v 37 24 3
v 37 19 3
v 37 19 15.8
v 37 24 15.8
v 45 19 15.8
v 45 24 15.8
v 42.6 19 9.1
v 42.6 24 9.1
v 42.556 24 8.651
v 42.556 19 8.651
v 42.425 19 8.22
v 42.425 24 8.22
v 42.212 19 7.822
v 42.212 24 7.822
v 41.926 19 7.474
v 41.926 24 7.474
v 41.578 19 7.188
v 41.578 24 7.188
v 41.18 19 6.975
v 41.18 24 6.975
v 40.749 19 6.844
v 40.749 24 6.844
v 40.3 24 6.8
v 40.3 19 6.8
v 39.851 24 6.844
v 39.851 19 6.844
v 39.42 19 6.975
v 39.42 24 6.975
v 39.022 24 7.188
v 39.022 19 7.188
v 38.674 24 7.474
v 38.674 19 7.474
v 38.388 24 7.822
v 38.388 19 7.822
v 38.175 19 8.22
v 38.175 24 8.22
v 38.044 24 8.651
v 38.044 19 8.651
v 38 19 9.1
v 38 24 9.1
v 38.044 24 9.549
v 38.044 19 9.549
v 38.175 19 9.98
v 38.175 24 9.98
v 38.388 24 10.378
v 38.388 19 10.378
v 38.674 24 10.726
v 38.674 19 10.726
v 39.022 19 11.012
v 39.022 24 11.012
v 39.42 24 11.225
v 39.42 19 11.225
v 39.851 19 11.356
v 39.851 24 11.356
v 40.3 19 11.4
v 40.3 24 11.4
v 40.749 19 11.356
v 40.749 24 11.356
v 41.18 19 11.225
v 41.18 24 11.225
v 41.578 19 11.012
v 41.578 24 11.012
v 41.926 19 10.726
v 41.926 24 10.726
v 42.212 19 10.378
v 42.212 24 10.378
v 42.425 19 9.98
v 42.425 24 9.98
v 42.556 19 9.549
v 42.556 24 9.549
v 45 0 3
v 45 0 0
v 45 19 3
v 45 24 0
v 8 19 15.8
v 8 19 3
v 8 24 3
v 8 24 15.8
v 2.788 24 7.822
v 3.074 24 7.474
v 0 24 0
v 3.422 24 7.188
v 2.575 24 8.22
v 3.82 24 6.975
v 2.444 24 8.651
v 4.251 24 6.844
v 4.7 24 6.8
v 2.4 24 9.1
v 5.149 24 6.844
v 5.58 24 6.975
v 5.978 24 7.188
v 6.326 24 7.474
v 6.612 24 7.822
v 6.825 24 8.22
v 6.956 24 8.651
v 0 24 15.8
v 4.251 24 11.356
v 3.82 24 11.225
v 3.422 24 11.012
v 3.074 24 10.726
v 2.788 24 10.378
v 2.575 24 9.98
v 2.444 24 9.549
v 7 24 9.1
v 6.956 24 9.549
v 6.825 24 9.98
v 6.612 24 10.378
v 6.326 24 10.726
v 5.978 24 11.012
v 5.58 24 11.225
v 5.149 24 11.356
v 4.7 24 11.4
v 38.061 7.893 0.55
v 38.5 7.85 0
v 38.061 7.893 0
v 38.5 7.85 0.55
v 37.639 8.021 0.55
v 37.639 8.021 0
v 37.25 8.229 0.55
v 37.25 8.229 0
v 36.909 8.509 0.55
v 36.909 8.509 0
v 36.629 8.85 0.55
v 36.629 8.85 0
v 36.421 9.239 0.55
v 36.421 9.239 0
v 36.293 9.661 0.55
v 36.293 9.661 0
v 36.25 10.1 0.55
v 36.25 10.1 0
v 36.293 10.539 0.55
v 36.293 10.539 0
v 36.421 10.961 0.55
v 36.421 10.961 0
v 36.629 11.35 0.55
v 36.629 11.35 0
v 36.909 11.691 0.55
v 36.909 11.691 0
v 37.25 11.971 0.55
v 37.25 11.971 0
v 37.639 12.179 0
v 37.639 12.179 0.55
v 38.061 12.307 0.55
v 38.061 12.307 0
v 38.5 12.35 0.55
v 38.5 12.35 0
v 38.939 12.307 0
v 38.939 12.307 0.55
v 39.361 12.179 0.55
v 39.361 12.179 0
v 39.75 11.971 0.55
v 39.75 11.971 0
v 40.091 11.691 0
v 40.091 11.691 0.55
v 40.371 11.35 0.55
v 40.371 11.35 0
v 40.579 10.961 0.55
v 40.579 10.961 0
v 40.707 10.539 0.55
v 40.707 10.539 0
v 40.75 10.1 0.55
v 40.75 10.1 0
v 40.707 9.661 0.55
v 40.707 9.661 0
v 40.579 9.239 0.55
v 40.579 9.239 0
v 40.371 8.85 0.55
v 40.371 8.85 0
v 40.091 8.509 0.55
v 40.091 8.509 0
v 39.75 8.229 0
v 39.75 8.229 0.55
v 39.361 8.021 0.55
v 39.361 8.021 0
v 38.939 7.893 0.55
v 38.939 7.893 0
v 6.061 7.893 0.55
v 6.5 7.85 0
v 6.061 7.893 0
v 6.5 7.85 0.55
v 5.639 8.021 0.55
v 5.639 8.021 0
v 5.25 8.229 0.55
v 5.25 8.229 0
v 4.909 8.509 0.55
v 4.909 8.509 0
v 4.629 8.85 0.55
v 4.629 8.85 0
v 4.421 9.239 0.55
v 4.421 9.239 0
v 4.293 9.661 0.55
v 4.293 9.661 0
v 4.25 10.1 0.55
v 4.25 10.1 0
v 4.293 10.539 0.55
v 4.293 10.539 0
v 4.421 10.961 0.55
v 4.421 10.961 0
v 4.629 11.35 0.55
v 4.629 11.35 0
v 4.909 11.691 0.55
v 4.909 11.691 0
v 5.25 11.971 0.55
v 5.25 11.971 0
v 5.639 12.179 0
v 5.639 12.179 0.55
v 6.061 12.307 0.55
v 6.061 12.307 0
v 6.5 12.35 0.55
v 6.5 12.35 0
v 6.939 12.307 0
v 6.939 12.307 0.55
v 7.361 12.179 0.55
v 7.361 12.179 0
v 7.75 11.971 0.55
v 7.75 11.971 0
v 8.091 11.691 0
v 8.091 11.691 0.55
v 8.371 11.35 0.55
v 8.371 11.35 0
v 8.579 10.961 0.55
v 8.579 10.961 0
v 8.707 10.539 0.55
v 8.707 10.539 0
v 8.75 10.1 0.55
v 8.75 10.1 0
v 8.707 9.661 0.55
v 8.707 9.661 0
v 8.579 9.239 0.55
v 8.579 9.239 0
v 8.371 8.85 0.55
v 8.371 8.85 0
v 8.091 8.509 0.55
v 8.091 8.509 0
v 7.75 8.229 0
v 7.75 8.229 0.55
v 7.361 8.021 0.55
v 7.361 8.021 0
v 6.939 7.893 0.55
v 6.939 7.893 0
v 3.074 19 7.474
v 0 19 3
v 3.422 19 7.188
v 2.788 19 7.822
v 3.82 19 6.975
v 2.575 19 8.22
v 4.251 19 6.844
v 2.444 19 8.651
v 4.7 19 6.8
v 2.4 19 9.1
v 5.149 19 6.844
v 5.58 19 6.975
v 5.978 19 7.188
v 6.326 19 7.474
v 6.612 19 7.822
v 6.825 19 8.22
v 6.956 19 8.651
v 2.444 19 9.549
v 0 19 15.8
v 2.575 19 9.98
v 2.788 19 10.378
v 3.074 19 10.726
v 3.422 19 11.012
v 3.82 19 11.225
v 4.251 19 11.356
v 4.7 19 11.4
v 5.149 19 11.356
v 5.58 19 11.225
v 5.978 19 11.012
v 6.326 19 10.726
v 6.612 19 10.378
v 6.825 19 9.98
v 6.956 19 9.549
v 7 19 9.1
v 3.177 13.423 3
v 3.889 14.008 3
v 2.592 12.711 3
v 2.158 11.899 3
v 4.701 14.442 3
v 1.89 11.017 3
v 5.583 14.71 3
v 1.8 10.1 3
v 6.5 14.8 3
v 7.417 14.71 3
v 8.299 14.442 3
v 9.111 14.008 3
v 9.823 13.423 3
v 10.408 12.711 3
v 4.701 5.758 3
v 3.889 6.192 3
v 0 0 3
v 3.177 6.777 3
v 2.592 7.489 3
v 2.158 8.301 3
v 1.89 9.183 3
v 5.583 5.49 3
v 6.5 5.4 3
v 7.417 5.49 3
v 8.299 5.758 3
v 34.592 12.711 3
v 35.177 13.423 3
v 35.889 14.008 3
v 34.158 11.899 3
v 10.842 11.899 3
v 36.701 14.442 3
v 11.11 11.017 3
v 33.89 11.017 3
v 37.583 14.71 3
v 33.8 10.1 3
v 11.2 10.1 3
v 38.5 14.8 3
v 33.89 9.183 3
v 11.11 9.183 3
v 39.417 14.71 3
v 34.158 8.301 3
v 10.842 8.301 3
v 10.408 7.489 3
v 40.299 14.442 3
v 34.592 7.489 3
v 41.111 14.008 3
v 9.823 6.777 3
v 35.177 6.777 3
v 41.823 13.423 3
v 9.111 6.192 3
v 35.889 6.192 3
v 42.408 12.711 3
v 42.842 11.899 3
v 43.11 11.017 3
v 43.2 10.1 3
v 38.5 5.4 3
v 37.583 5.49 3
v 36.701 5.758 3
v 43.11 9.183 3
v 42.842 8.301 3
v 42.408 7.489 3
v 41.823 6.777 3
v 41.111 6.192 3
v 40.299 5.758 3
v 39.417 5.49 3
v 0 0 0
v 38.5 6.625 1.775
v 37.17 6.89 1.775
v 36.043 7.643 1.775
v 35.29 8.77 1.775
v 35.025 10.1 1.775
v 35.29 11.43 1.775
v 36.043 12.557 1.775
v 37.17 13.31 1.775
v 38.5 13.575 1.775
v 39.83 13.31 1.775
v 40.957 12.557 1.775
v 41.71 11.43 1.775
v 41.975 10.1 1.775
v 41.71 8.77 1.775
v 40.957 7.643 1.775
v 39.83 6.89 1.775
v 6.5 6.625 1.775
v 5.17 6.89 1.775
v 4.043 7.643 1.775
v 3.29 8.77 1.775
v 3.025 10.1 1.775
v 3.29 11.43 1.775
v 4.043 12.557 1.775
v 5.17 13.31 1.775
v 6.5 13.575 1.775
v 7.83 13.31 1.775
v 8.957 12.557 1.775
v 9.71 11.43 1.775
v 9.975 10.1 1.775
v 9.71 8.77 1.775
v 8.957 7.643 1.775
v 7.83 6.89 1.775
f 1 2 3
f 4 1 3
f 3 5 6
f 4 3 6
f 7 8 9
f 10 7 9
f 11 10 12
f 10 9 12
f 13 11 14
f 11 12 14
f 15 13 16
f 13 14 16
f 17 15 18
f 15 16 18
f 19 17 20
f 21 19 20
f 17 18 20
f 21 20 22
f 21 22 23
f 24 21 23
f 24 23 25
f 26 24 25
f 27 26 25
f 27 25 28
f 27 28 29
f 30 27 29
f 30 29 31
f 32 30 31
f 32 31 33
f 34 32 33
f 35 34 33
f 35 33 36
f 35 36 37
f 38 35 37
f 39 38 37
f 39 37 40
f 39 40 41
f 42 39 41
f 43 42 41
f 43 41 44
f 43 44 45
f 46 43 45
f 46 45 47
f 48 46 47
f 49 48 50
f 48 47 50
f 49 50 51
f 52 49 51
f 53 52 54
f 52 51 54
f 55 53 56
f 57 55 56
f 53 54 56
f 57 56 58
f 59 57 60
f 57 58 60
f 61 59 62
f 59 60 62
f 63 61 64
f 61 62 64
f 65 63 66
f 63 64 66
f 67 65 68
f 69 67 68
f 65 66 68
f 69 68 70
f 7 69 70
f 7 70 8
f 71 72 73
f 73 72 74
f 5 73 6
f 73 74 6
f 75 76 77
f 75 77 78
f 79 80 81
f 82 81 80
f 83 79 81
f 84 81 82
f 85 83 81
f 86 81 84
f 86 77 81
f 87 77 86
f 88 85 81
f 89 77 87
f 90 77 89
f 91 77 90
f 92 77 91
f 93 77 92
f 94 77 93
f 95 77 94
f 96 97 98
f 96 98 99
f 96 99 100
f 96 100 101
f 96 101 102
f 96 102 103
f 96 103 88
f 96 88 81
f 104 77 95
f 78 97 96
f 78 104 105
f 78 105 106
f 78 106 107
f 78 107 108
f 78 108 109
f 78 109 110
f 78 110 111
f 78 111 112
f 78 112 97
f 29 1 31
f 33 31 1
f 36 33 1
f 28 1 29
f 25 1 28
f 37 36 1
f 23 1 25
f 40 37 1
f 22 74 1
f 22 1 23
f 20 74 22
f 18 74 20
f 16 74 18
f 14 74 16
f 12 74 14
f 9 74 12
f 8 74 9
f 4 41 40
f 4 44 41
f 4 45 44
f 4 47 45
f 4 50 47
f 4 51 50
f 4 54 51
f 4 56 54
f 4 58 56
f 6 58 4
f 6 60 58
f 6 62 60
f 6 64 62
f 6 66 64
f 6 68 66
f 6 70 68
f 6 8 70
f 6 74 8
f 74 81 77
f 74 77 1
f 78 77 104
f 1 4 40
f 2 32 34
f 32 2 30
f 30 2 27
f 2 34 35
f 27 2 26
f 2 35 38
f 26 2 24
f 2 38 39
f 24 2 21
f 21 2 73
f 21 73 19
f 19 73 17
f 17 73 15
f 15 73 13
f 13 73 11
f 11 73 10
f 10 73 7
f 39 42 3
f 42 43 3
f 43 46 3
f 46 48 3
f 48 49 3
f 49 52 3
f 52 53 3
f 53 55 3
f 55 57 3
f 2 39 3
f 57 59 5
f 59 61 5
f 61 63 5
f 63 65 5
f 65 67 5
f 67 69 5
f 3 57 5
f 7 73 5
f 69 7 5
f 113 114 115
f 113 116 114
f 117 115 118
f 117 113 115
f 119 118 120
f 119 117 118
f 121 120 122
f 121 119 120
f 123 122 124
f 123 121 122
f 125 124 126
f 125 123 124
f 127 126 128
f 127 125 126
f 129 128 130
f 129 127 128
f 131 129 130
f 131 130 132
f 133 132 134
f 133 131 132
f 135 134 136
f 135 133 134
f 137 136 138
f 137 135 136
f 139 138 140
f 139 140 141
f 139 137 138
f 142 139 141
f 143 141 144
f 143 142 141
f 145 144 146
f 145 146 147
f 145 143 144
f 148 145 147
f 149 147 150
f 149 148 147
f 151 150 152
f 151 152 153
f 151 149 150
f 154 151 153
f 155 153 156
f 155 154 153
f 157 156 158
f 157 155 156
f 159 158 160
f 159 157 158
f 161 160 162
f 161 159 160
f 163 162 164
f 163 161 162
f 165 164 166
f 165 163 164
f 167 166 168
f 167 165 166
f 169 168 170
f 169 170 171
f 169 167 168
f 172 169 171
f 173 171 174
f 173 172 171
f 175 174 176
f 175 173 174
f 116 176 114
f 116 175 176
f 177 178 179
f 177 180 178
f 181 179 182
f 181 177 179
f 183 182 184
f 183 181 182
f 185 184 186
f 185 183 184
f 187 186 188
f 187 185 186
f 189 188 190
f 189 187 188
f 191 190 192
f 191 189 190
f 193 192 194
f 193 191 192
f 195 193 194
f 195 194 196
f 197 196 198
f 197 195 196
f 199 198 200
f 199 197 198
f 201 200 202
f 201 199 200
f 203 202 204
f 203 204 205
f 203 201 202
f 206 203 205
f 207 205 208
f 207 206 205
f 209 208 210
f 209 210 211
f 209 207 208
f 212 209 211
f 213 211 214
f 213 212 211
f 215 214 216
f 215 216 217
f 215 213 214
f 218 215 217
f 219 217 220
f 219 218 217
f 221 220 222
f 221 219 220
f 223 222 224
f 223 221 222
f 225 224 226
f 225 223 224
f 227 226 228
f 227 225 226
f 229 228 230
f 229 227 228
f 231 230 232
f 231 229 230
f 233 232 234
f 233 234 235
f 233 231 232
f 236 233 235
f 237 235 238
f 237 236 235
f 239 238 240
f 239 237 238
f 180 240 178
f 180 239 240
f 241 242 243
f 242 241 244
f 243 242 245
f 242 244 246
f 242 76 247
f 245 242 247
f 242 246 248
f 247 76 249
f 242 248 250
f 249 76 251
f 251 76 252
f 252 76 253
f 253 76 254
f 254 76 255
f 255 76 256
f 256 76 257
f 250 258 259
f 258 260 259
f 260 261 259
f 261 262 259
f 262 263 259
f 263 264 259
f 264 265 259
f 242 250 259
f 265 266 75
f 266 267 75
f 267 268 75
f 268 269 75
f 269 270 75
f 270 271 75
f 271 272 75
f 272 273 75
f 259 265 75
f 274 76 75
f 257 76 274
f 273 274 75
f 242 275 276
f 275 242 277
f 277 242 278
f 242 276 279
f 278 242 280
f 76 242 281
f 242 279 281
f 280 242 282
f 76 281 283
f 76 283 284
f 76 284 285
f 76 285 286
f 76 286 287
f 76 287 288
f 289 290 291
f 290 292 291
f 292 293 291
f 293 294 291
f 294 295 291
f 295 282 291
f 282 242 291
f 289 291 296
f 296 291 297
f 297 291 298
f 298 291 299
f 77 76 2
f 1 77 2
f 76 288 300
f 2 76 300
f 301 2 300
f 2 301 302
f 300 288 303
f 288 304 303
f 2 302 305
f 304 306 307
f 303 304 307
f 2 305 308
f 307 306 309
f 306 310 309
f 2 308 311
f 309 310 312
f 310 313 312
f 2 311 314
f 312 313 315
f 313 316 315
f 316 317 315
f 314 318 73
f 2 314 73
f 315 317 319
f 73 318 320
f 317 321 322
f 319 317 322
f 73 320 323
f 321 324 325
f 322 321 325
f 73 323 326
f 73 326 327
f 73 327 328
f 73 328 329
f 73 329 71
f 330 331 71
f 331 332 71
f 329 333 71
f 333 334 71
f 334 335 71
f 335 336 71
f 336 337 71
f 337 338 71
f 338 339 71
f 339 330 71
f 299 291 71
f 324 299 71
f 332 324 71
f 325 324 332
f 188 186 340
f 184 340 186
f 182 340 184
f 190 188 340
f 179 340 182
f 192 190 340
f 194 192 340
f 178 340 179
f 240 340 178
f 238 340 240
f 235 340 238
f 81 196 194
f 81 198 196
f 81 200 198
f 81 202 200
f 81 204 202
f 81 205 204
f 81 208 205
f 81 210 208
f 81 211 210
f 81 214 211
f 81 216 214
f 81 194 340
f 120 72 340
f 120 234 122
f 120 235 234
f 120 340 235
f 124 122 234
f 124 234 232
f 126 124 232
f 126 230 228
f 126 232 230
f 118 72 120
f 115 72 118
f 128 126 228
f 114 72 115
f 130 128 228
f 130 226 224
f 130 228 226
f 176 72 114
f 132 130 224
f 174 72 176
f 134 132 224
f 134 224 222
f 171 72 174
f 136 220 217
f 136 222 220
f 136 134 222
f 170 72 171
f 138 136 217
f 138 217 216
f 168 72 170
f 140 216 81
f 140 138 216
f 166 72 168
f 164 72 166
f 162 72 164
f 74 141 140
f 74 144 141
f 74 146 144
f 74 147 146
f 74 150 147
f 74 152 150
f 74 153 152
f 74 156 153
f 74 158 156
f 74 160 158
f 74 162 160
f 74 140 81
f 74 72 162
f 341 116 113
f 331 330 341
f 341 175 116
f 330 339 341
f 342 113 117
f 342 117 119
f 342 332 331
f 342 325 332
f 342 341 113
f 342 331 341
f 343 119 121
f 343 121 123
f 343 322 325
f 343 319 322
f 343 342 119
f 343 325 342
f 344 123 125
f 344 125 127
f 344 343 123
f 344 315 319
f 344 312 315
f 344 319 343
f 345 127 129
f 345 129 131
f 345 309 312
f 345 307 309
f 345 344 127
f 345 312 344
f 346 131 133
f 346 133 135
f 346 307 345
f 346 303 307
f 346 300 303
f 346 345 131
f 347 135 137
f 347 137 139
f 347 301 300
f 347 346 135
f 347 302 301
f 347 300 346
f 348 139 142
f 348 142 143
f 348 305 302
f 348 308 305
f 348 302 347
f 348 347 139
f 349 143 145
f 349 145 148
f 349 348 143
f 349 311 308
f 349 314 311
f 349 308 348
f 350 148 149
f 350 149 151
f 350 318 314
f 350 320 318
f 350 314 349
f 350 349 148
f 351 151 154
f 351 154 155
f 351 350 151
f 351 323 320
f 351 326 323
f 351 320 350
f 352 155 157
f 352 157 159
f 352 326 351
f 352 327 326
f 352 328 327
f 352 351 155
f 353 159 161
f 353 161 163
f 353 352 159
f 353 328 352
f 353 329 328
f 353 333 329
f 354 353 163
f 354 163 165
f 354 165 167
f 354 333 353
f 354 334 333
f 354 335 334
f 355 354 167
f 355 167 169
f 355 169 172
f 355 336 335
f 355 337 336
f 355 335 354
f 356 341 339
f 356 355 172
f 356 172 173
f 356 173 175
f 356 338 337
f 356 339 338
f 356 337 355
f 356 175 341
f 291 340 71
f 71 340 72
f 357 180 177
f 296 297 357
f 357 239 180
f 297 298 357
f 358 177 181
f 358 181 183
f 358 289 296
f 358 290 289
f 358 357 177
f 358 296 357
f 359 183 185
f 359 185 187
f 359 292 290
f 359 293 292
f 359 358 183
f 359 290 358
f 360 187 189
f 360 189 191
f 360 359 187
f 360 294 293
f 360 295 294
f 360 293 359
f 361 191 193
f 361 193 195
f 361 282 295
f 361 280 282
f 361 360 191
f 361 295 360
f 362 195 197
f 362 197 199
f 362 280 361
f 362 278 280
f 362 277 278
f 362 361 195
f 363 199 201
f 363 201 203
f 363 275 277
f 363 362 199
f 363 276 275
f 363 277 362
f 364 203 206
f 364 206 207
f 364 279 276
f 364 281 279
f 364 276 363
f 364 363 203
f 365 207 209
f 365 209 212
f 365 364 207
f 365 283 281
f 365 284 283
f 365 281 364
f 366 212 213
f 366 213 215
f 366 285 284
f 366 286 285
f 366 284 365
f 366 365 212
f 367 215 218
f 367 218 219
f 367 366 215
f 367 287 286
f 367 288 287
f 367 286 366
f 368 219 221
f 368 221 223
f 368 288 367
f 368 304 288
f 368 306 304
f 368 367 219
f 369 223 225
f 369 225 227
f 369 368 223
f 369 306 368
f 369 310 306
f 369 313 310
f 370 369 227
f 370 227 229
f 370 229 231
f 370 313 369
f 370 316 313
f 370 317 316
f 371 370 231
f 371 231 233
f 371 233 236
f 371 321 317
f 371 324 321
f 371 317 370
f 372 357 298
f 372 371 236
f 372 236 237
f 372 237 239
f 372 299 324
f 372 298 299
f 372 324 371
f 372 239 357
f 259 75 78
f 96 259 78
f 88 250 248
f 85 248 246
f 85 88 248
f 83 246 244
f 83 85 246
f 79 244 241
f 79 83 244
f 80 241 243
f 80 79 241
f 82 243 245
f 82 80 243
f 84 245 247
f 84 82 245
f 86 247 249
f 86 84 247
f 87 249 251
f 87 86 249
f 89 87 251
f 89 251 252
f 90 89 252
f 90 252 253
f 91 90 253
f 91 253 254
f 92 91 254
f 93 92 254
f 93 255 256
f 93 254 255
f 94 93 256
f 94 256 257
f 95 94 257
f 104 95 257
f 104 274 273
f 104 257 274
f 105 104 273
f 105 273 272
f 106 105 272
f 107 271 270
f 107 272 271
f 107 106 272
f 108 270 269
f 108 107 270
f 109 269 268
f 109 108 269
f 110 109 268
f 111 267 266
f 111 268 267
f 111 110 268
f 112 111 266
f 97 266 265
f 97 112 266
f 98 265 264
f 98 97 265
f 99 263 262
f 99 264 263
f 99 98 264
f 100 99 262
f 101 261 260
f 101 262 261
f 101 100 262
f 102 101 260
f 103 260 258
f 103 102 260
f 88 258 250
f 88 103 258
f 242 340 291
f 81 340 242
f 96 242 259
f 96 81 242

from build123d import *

# Parameters (mm, degrees)
ESQUISSE1_W                = 45
ESQUISSE1_H                = 19
BOSS_EXTRU_1_DEPTH         = 3
R_P_TITION_LIN_AIRE3_COUNT = 2
R_P_TITION_LIN_AIRE3_PITCH = 32
ESQUISSE7_W                = 15.8
ESQUISSE7_H                = 5
BOSS_EXTRU_2_DEPTH         = 45
ESQUISSE8_W                = 29
ESQUISSE8_H                = 12.8
ENL_V_MAT_EXTRU_4_DEPTH    = 3
ESQUISSE8_5_W              = 29
ESQUISSE8_5_H              = 12.8
ENL_V_MAT_EXTRU_5_DEPTH    = 6
ESQUISSE9_R                = 2.3
ENL_V_MAT_EXTRU_6_DEPTH    = 10


with BuildPart() as part:
    # Esquisse1 → Boss.-Extru.1 (new body)
    with BuildSketch(Plane.XY):
        with Locations((22.5, 9.5)):
            Rectangle(ESQUISSE1_W, ESQUISSE1_H)
    extrude(amount=BOSS_EXTRU_1_DEPTH)

    # Esquisse5 → Fraisage pour vis _ t_te frais_e M42 (revolve, cut)
    with BuildSketch(Plane(origin=(38.5, 10.1, 3), x_dir=(0, -1, 0), z_dir=(1, 0, 0))):
        Polygon((0, 0), (0, 3), (2.25, 3), (2.25, 2.45), (4.7, 0), align=None)
    fraisage_pour_vis_t_te_frais_e_m42 = revolve(axis=Axis((38.5, 10.1, 9.35), (0, 0, -1)), mode=Mode.SUBTRACT)

    # R_p_tition lin_aire3: Fraisage pour vis _ t_te frais_e M42 ×2
    with Locations(*[(-i * R_P_TITION_LIN_AIRE3_PITCH, 0, 0) for i in range(1, R_P_TITION_LIN_AIRE3_COUNT)]):
        add(fraisage_pour_vis_t_te_frais_e_m42, mode=Mode.SUBTRACT)

    # Esquisse7 → Boss.-Extru.2 (add)
    with BuildSketch(Plane(origin=(45, 19, 0), x_dir=(0, 0, 1), z_dir=(-1, 0, 0))):
        with Locations((7.9, 2.5)):
            Rectangle(ESQUISSE7_W, ESQUISSE7_H)
    extrude(amount=BOSS_EXTRU_2_DEPTH)

    # Esquisse8 → Enl_v. mat.-Extru.4 (cut)
    with BuildSketch(Plane.XZ.offset(-19)):
        with Locations((22.5, 9.4)):
            Rectangle(ESQUISSE8_W, ESQUISSE8_H)
    extrude(amount=-ENL_V_MAT_EXTRU_4_DEPTH, mode=Mode.SUBTRACT)

    # Esquisse8_5 → Enl_v. mat.-Extru.5 (cut, through all)
    with BuildSketch(Plane.XZ.offset(-19)):
        with Locations((22.5, 9.4)):
            Rectangle(ESQUISSE8_5_W, ESQUISSE8_5_H)
    extrude(amount=-ENL_V_MAT_EXTRU_5_DEPTH, mode=Mode.SUBTRACT)

    # Esquisse9 → Enl_v. mat.-Extru.6 (cut)
    with BuildSketch(Plane(origin=(0, 24, 0), x_dir=(1, 0, 0), z_dir=(0, 1, 0))):
        with Locations((40.3, -9.1)):
            Circle(ESQUISSE9_R)
    enl_v_mat_extru_6 = extrude(amount=-ENL_V_MAT_EXTRU_6_DEPTH, mode=Mode.SUBTRACT)

    # Sym_trie1: Enl_v. mat.-Extru.6 across plane
    add(enl_v_mat_extru_6.mirror(Plane(origin=(22.5, 0, 0), x_dir=(0, 0, 1), z_dir=(1, 0, 0))), mode=Mode.SUBTRACT)


solid = part.part
